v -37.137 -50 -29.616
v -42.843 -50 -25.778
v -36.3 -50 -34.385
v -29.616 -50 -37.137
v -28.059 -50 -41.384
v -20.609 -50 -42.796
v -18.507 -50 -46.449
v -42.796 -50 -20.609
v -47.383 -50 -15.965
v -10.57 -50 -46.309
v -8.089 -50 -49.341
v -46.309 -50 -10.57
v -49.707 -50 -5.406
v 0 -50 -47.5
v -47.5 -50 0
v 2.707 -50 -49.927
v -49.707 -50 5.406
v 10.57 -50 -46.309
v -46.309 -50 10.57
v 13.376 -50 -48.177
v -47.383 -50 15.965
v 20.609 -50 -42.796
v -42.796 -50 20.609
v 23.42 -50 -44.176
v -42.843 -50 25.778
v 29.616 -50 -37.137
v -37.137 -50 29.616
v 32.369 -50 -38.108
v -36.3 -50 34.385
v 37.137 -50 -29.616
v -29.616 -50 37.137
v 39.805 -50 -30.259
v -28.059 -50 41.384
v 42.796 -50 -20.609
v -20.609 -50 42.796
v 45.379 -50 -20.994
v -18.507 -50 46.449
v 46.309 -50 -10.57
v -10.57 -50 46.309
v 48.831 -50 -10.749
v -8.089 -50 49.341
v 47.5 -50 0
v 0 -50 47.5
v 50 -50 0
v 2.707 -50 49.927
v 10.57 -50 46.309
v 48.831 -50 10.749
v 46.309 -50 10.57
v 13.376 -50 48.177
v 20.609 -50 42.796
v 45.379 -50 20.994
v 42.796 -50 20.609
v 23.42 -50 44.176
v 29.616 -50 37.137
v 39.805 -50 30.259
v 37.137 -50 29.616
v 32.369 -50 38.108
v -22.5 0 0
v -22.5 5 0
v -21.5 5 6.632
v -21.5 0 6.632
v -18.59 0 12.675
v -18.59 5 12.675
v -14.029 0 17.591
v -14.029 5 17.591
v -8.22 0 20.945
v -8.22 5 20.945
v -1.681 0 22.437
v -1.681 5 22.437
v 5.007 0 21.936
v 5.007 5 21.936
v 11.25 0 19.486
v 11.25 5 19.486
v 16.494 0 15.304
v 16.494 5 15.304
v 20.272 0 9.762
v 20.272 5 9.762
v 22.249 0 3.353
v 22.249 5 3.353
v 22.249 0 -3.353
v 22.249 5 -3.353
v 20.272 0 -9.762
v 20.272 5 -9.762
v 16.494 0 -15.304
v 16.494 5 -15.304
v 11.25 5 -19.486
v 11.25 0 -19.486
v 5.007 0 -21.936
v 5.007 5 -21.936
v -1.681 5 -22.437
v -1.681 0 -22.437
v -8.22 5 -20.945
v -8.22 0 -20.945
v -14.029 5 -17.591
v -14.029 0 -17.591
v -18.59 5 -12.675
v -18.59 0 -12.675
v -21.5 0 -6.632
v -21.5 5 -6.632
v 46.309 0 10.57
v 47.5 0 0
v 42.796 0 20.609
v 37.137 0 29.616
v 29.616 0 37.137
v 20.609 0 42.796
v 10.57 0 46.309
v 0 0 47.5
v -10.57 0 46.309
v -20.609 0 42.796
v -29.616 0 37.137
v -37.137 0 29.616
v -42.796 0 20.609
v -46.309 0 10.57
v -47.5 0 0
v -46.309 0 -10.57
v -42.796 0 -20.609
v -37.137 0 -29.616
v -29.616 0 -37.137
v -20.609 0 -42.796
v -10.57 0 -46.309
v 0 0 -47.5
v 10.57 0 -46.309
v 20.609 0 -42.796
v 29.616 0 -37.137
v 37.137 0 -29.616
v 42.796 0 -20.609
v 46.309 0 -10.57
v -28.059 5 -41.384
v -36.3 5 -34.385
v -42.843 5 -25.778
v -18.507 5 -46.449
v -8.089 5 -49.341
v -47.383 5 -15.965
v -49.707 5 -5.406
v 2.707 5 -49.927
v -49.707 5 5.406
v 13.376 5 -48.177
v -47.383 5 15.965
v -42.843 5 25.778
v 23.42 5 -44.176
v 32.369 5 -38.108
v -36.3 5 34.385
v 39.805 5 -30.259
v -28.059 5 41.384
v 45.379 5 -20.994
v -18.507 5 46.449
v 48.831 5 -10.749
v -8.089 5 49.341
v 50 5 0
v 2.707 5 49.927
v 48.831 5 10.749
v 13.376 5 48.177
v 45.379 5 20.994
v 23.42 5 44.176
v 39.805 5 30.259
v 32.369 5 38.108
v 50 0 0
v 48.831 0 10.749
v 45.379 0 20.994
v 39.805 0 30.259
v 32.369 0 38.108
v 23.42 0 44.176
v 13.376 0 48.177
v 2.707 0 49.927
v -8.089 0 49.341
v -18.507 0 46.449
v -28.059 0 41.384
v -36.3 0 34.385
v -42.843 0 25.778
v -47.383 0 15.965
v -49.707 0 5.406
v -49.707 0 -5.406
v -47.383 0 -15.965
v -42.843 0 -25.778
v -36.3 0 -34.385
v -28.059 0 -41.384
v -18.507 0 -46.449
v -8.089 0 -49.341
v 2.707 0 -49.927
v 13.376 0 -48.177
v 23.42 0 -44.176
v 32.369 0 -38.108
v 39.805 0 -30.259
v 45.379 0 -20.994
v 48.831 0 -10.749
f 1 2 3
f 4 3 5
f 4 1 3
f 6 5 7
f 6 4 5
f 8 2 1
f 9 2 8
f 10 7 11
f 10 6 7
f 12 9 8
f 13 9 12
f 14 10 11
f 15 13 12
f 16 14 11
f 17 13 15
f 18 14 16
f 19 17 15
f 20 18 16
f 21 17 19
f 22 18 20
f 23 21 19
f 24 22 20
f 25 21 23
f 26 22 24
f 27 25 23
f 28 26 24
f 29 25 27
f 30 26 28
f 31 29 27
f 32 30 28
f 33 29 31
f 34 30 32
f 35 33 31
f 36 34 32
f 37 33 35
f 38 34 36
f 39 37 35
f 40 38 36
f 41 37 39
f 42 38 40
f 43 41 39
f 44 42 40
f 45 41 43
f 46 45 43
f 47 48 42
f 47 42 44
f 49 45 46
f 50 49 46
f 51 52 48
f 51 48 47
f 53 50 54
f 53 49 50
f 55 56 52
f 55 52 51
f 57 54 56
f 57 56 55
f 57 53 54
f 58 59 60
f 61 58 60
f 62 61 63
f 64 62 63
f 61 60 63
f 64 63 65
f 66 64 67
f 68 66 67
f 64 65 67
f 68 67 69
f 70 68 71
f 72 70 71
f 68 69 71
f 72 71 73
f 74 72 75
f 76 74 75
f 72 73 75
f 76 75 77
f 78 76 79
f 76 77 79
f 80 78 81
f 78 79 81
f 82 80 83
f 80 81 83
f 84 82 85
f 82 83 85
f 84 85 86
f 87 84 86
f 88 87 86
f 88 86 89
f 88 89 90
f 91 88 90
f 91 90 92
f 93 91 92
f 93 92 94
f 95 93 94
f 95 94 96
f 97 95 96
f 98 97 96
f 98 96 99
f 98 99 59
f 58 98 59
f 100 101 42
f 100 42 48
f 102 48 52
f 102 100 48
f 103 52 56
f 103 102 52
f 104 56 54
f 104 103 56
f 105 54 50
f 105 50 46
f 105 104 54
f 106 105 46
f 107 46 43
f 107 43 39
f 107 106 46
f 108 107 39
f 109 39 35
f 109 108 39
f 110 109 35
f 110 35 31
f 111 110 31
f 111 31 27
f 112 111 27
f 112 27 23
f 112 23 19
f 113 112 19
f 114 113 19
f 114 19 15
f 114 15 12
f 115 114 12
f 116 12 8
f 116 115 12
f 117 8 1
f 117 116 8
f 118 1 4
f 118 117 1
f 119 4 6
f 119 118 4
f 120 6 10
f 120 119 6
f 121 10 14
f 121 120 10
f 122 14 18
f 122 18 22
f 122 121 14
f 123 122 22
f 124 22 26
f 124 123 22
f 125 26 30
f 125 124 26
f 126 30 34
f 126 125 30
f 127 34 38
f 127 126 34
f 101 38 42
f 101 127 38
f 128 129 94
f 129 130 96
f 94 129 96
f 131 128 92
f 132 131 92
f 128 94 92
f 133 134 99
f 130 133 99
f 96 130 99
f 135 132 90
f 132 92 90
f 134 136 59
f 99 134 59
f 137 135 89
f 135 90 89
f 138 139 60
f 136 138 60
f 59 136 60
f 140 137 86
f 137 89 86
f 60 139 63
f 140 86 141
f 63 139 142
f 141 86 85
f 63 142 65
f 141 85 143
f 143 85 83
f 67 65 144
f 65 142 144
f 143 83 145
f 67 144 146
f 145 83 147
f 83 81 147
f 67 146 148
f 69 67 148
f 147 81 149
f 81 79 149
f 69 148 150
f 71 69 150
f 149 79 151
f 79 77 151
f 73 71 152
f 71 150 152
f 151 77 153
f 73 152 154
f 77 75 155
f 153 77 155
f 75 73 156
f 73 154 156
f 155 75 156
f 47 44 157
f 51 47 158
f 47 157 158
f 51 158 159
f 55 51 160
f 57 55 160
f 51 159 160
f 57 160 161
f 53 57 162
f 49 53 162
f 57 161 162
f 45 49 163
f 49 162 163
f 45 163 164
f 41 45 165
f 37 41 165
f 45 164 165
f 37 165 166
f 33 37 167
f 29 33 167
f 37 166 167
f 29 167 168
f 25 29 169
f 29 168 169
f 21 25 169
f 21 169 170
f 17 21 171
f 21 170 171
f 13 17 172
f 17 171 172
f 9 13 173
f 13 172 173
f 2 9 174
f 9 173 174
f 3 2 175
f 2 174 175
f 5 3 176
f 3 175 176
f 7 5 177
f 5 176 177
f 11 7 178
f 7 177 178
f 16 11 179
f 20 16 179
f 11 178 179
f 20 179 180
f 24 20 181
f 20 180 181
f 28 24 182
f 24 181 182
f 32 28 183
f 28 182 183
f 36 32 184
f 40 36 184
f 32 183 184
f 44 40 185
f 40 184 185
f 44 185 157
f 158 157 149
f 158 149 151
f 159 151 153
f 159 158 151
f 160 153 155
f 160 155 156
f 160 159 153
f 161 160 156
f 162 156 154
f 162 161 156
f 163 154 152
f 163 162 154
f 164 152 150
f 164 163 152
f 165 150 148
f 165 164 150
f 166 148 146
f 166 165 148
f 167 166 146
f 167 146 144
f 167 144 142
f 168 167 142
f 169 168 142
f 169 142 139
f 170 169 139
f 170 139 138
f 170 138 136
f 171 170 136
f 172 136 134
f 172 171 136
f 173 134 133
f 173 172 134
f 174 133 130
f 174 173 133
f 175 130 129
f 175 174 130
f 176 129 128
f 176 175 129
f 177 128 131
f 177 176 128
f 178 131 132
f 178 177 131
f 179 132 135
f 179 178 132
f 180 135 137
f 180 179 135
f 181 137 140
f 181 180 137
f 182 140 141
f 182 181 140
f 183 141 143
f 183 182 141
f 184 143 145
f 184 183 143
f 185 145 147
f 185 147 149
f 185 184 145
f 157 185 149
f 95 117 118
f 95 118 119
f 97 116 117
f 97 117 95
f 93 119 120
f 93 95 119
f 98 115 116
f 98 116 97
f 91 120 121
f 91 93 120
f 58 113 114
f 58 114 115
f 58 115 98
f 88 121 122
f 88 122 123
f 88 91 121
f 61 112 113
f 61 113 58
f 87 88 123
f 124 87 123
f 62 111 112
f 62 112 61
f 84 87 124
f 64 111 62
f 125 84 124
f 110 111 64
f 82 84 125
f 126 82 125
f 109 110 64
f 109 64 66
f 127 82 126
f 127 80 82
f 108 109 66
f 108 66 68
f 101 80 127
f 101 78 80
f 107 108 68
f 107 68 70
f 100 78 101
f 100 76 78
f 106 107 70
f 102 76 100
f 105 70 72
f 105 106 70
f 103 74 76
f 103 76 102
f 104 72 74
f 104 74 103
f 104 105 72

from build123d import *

# Parameters (mm, degrees)
F0_R     = 50
F1_DEPTH = 5
F2_R     = 50
F2_R_2   = 47.5
F3_DEPTH = 50
F4_R     = 22.5
F6_DEPTH = 55.001


# Not quite as in the source:
# - the program builds the solid bodies; features that only make, move or delete a surface that nothing else refers to are left out


with BuildPart() as f1:
    # F0 (on Front) → F1 (new body)
    with BuildSketch(Plane.XZ):
        Circle(F0_R)
    extrude(amount=-F1_DEPTH)

    # F2 (on Front) → F3 (join)
    with BuildSketch(Plane.XZ):
        Circle(F2_R)
        Circle(F2_R_2, mode=Mode.SUBTRACT)
    extrude(amount=F3_DEPTH)

    # F4 (on face) → F6 (cut, through all)
    with BuildSketch(Plane(origin=(0, 5, 0), x_dir=(-1, 0, 0), z_dir=(0, 1, 0))):
        Circle(F4_R)
    extrude(amount=-F6_DEPTH, mode=Mode.SUBTRACT)


solid = f1.part
